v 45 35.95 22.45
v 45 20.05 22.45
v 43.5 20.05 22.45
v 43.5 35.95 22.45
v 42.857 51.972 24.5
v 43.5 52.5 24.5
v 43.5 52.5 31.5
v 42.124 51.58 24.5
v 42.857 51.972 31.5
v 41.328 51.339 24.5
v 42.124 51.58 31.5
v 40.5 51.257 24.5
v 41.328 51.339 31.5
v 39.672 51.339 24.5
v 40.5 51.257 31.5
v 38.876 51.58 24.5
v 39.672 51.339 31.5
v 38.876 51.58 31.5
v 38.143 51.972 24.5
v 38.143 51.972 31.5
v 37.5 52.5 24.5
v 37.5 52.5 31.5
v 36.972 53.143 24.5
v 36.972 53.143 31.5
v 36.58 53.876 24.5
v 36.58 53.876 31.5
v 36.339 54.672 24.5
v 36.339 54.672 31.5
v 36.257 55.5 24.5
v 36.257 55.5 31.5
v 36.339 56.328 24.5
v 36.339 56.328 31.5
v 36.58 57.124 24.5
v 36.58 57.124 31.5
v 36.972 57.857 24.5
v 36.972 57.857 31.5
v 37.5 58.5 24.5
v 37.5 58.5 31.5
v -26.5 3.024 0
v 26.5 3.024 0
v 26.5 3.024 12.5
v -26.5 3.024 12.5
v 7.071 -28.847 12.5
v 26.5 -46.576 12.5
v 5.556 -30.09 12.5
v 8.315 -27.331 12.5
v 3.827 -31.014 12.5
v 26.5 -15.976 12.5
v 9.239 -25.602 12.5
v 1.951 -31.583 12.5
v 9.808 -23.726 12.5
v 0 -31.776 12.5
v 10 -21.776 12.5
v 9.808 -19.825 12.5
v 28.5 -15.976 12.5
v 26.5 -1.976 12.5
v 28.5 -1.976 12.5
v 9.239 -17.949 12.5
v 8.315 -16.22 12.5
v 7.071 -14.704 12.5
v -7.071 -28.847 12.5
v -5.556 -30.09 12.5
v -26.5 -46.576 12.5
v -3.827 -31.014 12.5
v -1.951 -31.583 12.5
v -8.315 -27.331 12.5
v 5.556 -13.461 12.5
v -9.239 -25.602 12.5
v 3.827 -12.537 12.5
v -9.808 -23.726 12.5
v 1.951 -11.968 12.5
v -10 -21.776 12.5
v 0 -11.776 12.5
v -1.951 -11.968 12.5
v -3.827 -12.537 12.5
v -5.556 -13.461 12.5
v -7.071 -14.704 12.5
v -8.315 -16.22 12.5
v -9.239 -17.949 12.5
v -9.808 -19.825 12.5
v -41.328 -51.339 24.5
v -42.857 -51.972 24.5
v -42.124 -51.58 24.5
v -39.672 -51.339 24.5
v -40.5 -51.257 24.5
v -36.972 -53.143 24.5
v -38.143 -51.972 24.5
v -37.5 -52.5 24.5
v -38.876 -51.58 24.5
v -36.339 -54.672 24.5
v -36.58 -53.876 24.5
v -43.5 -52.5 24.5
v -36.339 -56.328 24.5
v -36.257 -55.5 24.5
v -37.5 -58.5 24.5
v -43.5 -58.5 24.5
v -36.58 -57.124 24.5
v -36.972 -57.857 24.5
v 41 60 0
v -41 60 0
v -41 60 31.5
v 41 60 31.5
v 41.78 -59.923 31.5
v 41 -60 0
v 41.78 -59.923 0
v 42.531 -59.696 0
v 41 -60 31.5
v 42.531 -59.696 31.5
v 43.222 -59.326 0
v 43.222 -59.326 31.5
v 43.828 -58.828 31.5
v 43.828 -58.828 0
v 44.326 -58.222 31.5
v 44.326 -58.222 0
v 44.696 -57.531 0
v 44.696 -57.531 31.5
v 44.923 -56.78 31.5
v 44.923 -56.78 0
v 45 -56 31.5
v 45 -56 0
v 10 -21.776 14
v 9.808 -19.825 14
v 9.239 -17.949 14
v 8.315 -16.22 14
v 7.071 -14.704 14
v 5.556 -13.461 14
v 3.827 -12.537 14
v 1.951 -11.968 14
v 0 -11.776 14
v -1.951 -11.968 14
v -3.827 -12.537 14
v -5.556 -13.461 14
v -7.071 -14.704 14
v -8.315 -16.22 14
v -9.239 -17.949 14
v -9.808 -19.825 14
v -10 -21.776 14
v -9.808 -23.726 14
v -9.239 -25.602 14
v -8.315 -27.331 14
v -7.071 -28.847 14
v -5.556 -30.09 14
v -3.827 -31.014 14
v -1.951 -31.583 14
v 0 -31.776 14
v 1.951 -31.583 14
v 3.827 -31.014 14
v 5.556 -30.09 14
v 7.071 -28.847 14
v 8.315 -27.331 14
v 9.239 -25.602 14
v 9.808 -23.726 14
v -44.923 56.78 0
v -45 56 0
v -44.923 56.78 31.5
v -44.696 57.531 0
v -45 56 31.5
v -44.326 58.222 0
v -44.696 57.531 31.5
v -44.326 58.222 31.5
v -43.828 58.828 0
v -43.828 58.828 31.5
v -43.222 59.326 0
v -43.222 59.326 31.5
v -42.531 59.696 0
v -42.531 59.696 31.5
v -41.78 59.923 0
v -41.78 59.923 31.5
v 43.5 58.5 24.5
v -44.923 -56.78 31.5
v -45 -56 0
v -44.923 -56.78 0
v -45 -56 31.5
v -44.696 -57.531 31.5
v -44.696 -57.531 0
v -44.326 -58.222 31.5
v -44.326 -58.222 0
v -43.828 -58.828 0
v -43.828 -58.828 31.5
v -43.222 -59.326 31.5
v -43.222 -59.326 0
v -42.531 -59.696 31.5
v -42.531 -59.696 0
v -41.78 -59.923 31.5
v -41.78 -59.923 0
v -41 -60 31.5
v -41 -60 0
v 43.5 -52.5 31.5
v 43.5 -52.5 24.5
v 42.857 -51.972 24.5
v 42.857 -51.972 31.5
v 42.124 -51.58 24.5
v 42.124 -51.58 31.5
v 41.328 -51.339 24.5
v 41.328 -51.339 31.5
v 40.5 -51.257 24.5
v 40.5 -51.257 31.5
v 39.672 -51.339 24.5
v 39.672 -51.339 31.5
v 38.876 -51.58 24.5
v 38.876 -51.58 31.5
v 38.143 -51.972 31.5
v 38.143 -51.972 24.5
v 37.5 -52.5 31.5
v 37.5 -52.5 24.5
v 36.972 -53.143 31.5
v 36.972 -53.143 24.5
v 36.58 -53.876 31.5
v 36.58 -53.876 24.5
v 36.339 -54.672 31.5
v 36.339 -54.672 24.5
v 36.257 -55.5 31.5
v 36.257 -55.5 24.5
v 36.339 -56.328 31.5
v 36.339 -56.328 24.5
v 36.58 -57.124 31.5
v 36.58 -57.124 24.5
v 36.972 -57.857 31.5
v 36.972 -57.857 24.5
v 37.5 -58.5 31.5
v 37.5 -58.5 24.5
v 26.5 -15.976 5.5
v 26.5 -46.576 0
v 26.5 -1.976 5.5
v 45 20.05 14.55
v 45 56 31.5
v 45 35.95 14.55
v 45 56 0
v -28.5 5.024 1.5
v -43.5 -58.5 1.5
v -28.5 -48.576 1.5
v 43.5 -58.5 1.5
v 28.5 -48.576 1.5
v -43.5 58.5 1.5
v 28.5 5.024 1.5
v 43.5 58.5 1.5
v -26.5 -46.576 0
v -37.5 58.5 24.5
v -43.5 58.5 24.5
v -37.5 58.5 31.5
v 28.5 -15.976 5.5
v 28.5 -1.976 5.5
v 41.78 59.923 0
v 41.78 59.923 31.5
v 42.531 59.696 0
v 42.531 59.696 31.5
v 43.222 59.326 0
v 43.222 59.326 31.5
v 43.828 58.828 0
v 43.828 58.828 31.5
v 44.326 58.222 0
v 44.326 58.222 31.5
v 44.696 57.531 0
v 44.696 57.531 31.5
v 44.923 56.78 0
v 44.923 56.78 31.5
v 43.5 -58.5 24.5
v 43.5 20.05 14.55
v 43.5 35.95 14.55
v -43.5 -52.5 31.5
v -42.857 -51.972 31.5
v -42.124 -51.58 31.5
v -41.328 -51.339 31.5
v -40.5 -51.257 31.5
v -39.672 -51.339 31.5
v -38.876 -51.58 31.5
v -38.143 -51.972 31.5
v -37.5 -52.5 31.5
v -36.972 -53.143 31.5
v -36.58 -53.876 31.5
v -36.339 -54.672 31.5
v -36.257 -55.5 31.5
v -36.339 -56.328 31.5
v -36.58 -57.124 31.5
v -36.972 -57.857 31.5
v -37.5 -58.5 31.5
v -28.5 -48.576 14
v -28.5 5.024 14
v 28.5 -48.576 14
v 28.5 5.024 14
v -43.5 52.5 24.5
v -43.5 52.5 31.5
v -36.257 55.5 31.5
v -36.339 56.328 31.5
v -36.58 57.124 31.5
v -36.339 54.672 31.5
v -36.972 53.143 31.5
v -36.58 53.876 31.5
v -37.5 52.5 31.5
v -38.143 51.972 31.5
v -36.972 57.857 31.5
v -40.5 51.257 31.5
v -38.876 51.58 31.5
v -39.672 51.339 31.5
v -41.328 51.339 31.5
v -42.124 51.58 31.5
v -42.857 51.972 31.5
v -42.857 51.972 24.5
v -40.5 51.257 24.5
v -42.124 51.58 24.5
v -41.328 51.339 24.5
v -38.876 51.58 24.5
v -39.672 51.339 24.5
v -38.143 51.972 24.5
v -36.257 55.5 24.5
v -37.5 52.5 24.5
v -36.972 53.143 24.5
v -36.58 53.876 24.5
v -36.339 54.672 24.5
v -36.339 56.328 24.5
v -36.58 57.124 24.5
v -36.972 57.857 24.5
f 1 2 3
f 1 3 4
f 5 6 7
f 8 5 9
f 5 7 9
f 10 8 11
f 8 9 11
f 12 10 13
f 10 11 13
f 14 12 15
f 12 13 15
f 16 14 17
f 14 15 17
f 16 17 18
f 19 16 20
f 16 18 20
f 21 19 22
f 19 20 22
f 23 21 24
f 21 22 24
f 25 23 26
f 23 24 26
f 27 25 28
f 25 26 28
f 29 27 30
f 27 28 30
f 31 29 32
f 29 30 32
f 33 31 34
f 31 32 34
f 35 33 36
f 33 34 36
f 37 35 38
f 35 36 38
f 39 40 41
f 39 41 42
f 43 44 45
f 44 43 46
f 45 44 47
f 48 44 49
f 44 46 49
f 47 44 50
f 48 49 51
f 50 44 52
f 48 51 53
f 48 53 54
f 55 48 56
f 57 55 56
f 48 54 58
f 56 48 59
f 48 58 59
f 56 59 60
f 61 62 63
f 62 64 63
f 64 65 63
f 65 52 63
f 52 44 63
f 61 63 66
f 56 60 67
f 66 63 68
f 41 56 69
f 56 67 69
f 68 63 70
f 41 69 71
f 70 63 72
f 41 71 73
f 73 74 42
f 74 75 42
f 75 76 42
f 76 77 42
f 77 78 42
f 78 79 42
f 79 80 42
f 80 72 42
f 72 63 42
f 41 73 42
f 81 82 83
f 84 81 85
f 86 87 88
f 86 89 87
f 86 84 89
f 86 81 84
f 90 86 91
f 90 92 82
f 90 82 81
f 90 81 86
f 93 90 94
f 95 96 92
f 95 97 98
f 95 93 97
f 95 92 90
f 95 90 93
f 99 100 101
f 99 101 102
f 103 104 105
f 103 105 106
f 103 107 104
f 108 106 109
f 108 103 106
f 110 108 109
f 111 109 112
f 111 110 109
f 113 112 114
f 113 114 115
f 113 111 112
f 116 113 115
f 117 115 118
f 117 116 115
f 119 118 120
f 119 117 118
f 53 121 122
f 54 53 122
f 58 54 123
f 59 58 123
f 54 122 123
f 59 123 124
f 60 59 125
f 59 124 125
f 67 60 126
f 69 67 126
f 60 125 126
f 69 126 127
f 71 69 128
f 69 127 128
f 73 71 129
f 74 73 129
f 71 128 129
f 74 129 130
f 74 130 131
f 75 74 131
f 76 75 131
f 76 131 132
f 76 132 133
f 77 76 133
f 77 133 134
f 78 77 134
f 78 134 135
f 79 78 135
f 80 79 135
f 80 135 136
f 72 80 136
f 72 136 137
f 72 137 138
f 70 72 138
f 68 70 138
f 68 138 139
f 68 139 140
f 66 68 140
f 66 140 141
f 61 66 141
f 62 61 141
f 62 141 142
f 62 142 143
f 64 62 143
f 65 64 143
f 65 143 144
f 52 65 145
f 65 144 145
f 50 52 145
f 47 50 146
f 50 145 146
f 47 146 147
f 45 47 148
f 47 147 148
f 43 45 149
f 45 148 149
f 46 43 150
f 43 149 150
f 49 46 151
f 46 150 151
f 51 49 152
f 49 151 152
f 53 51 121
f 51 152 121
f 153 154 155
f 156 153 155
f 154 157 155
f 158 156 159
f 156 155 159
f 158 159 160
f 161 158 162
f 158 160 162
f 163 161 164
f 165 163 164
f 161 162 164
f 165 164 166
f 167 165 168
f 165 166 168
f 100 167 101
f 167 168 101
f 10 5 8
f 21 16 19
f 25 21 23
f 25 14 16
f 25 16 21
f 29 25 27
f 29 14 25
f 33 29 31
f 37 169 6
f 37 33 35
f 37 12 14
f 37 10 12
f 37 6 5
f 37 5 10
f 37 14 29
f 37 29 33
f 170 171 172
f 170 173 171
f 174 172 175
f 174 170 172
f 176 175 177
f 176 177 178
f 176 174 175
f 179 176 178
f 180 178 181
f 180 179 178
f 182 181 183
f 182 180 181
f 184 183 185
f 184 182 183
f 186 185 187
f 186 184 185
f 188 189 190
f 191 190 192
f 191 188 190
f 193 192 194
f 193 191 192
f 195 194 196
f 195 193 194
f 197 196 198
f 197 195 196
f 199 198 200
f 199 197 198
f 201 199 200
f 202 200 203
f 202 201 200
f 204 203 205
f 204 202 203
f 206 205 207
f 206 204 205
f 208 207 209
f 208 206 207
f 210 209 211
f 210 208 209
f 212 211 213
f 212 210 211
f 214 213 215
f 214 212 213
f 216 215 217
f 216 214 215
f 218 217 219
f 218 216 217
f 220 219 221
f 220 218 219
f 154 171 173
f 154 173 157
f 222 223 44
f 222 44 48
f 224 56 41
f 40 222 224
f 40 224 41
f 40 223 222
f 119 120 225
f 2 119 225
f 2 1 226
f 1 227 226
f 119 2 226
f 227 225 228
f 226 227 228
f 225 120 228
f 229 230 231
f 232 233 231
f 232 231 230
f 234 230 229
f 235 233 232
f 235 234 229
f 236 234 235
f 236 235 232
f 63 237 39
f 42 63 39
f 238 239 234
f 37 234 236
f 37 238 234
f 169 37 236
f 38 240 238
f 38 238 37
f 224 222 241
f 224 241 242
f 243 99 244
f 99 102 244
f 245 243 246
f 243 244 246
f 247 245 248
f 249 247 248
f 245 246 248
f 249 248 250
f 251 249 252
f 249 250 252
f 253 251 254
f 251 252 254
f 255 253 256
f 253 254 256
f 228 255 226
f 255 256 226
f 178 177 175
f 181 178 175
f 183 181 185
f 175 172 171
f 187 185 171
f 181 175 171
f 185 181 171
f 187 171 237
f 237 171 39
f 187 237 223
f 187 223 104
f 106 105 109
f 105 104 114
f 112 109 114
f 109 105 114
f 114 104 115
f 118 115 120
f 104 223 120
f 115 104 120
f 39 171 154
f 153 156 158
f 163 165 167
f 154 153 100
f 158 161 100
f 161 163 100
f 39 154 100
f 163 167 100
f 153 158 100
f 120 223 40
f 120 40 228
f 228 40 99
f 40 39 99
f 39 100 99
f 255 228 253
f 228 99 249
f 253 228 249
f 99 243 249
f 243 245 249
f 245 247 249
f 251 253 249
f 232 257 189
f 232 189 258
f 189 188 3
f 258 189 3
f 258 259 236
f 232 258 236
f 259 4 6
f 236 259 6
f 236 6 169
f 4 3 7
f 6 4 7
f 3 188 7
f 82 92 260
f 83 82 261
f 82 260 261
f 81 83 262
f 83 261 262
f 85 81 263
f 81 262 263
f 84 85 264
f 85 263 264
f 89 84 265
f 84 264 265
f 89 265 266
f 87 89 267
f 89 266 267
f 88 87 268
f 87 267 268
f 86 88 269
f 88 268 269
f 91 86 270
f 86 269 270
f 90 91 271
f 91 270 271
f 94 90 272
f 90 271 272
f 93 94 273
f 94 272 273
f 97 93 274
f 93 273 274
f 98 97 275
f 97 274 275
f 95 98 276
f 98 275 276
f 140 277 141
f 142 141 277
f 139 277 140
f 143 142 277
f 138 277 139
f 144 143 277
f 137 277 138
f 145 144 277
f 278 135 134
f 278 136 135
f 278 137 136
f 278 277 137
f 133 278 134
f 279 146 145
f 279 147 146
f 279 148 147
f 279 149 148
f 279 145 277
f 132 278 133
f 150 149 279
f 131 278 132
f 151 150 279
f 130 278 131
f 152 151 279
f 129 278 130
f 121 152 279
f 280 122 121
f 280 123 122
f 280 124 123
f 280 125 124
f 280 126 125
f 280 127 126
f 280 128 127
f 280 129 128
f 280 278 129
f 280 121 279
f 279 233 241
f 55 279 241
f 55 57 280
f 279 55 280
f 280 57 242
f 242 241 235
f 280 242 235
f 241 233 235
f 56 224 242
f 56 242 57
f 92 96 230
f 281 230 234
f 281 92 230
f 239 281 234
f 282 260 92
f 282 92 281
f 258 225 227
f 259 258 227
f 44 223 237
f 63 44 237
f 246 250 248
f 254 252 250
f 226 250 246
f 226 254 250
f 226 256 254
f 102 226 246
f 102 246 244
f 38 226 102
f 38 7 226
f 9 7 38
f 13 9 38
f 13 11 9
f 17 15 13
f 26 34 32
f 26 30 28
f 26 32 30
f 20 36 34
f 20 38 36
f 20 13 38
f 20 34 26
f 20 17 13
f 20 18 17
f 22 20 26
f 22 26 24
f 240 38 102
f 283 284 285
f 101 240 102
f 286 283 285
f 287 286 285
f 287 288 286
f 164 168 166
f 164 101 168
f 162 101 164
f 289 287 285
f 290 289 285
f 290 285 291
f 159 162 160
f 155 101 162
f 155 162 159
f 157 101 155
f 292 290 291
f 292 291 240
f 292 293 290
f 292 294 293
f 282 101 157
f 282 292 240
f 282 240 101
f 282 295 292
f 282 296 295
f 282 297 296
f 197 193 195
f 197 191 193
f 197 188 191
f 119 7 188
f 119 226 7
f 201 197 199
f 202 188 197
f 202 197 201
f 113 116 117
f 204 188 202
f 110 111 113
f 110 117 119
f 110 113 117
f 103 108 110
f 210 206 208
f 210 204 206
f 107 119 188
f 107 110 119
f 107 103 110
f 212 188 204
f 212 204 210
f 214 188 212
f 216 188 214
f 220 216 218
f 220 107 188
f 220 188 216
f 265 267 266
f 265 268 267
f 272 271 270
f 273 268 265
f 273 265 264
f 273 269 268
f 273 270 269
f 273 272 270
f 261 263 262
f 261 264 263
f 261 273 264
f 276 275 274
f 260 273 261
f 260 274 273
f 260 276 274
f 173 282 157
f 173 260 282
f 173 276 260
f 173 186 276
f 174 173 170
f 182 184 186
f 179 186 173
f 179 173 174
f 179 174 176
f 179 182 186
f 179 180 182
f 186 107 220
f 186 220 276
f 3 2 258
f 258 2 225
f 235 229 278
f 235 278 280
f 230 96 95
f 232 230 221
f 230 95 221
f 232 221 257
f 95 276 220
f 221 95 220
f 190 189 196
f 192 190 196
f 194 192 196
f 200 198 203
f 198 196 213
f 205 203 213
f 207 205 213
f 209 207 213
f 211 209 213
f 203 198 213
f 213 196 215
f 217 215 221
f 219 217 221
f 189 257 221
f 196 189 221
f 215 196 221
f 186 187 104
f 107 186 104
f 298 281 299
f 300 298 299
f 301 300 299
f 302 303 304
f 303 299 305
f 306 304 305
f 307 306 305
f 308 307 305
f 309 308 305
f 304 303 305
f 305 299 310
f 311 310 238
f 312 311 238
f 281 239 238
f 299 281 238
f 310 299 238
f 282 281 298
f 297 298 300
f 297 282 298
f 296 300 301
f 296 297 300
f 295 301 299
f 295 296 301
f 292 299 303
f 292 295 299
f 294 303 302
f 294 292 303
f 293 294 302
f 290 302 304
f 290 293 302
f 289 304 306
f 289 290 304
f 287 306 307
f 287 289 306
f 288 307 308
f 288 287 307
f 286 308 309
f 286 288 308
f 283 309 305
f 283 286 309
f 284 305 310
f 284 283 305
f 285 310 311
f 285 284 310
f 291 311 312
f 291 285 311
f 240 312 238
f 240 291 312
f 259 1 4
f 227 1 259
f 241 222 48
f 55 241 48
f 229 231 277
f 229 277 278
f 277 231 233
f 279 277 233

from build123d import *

# Parameters (mm, degrees)
SKETCH2_W               = 90
SKETCH2_H               = 120
BOSS_EXTRUDE1_DEPTH     = 31.5
SKETCH4_W               = 87
SKETCH4_H               = 117
CUT_EXTRUDE1_DEPTH      = 30
FILLET4_R               = 4
SKETCH18_W              = 57
SKETCH18_H              = 53.6
KHAY_PIN_DEPTH          = 12.5
SKETCH21_W              = 53
SKETCH21_H              = 49.6
BOSS_EXTRUDE11_DEPTH    = 15
SKETCH22_W              = 53
SKETCH22_H              = 49.6
CUT_EXTRUDE4_DEPTH      = 13.5
SKETCH30_W              = 7
SKETCH30_H              = 14
CUT_EXTRUDE8_DEPTH      = 5
SKETCH34_R              = 4.242640687
BOSS_EXTRUDE12_DEPTH    = 7
SKETCH37_W              = 7.9
SKETCH37_H              = 15.9
CUT_EXTRUDE10_DEPTH     = 5
MIRROR2_COPY_1_SKETCH_R = 4.242640687
MIRROR2_COPY_1_DEPTH    = 7
SKETCH38_R              = 10
CUT_EXTRUDE11_DEPTH     = 10


with BuildPart() as part:
    # Sketch2 → Boss-Extrude1 (new body)
    with BuildSketch(Plane.XY):
        Rectangle(SKETCH2_W, SKETCH2_H)
    extrude(amount=BOSS_EXTRUDE1_DEPTH)

    # Sketch4 → Cut-Extrude1 (cut)
    with BuildSketch(Plane.XY.offset(31.5)):
        Rectangle(SKETCH4_W, SKETCH4_H)
    extrude(amount=-CUT_EXTRUDE1_DEPTH, mode=Mode.SUBTRACT)

    # Fillet4
    fillet4_edges = [part.edges().sort_by_distance(p)[0] for p in [
        (45, -60, 15.75),
        (-45, -60, 15.75),
        (-45, 60, 15.75),
        (45, 60, 15.75),
    ]]
    fillet(fillet4_edges, radius=FILLET4_R)

    # Sketch18 → khay_pin (add)
    with BuildSketch(Plane.XY.offset(1.5)):
        with Locations((0, -21.775547075)):
            Rectangle(SKETCH18_W, SKETCH18_H)
    extrude(amount=KHAY_PIN_DEPTH)

    # Sketch21 → Boss-Extrude11 (add)
    with BuildSketch(Plane.XY.offset(14)):
        with Locations((0, -21.775547075)):
            Rectangle(SKETCH21_W, SKETCH21_H)
    extrude(amount=-BOSS_EXTRUDE11_DEPTH)

    # Sketch22 → Cut-Extrude4 (cut)
    with BuildSketch(Plane(origin=(0, 0, -1), x_dir=(-1, 0, 0), z_dir=(0, 0, -1))):
        with Locations((0, -21.775547075)):
            Rectangle(SKETCH22_W, SKETCH22_H)
    extrude(amount=-CUT_EXTRUDE4_DEPTH, mode=Mode.SUBTRACT)

    # Sketch30 → Cut-Extrude8 (cut)
    with BuildSketch(Plane.ZY.offset(-26.5)):
        with Locations((9, -8.975547075)):
            Rectangle(SKETCH30_W, SKETCH30_H)
    extrude(amount=-CUT_EXTRUDE8_DEPTH, mode=Mode.SUBTRACT)

    # Sketch34 → Boss-Extrude12 (add)
    with BuildSketch(Plane.XY.offset(31.5)):
        with Locations((-40.5, 55.5)):
            Circle(SKETCH34_R)
    boss_extrude12 = extrude(amount=-BOSS_EXTRUDE12_DEPTH)

    # Sketch37 → Cut-Extrude10 (cut)
    with BuildSketch(Plane(origin=(45, 0, 0), x_dir=(0, 0, -1), z_dir=(1, 0, 0))):
        with Locations((-18.5, 28)):
            Rectangle(SKETCH37_W, SKETCH37_H)
    extrude(amount=-CUT_EXTRUDE10_DEPTH, mode=Mode.SUBTRACT)

    # Mirror1: Boss-Extrude12 across plane
    add(boss_extrude12.mirror(Plane(origin=(0, 0, 0), x_dir=(0, 0, 1), z_dir=(1, 0, 0))))

    # Mirror2: Boss-Extrude12 across plane
    add(boss_extrude12.mirror(Plane.ZX))

    # Mirror2 copy 1 sketch → Mirror2 copy 1 (add)
    with BuildSketch(Plane(origin=(0, 0, 31.5), x_dir=(-1, 0, 0), z_dir=(0, 0, 1))):
        with Locations((-40.5, 55.5)):
            Circle(MIRROR2_COPY_1_SKETCH_R)
    extrude(amount=-MIRROR2_COPY_1_DEPTH)

    # Sketch38 → Cut-Extrude11 (cut)
    with BuildSketch(Plane.XY.offset(14)):
        with Locations((0, -21.775547075)):
            Circle(SKETCH38_R)
    extrude(amount=-CUT_EXTRUDE11_DEPTH, mode=Mode.SUBTRACT)


solid = part.part
